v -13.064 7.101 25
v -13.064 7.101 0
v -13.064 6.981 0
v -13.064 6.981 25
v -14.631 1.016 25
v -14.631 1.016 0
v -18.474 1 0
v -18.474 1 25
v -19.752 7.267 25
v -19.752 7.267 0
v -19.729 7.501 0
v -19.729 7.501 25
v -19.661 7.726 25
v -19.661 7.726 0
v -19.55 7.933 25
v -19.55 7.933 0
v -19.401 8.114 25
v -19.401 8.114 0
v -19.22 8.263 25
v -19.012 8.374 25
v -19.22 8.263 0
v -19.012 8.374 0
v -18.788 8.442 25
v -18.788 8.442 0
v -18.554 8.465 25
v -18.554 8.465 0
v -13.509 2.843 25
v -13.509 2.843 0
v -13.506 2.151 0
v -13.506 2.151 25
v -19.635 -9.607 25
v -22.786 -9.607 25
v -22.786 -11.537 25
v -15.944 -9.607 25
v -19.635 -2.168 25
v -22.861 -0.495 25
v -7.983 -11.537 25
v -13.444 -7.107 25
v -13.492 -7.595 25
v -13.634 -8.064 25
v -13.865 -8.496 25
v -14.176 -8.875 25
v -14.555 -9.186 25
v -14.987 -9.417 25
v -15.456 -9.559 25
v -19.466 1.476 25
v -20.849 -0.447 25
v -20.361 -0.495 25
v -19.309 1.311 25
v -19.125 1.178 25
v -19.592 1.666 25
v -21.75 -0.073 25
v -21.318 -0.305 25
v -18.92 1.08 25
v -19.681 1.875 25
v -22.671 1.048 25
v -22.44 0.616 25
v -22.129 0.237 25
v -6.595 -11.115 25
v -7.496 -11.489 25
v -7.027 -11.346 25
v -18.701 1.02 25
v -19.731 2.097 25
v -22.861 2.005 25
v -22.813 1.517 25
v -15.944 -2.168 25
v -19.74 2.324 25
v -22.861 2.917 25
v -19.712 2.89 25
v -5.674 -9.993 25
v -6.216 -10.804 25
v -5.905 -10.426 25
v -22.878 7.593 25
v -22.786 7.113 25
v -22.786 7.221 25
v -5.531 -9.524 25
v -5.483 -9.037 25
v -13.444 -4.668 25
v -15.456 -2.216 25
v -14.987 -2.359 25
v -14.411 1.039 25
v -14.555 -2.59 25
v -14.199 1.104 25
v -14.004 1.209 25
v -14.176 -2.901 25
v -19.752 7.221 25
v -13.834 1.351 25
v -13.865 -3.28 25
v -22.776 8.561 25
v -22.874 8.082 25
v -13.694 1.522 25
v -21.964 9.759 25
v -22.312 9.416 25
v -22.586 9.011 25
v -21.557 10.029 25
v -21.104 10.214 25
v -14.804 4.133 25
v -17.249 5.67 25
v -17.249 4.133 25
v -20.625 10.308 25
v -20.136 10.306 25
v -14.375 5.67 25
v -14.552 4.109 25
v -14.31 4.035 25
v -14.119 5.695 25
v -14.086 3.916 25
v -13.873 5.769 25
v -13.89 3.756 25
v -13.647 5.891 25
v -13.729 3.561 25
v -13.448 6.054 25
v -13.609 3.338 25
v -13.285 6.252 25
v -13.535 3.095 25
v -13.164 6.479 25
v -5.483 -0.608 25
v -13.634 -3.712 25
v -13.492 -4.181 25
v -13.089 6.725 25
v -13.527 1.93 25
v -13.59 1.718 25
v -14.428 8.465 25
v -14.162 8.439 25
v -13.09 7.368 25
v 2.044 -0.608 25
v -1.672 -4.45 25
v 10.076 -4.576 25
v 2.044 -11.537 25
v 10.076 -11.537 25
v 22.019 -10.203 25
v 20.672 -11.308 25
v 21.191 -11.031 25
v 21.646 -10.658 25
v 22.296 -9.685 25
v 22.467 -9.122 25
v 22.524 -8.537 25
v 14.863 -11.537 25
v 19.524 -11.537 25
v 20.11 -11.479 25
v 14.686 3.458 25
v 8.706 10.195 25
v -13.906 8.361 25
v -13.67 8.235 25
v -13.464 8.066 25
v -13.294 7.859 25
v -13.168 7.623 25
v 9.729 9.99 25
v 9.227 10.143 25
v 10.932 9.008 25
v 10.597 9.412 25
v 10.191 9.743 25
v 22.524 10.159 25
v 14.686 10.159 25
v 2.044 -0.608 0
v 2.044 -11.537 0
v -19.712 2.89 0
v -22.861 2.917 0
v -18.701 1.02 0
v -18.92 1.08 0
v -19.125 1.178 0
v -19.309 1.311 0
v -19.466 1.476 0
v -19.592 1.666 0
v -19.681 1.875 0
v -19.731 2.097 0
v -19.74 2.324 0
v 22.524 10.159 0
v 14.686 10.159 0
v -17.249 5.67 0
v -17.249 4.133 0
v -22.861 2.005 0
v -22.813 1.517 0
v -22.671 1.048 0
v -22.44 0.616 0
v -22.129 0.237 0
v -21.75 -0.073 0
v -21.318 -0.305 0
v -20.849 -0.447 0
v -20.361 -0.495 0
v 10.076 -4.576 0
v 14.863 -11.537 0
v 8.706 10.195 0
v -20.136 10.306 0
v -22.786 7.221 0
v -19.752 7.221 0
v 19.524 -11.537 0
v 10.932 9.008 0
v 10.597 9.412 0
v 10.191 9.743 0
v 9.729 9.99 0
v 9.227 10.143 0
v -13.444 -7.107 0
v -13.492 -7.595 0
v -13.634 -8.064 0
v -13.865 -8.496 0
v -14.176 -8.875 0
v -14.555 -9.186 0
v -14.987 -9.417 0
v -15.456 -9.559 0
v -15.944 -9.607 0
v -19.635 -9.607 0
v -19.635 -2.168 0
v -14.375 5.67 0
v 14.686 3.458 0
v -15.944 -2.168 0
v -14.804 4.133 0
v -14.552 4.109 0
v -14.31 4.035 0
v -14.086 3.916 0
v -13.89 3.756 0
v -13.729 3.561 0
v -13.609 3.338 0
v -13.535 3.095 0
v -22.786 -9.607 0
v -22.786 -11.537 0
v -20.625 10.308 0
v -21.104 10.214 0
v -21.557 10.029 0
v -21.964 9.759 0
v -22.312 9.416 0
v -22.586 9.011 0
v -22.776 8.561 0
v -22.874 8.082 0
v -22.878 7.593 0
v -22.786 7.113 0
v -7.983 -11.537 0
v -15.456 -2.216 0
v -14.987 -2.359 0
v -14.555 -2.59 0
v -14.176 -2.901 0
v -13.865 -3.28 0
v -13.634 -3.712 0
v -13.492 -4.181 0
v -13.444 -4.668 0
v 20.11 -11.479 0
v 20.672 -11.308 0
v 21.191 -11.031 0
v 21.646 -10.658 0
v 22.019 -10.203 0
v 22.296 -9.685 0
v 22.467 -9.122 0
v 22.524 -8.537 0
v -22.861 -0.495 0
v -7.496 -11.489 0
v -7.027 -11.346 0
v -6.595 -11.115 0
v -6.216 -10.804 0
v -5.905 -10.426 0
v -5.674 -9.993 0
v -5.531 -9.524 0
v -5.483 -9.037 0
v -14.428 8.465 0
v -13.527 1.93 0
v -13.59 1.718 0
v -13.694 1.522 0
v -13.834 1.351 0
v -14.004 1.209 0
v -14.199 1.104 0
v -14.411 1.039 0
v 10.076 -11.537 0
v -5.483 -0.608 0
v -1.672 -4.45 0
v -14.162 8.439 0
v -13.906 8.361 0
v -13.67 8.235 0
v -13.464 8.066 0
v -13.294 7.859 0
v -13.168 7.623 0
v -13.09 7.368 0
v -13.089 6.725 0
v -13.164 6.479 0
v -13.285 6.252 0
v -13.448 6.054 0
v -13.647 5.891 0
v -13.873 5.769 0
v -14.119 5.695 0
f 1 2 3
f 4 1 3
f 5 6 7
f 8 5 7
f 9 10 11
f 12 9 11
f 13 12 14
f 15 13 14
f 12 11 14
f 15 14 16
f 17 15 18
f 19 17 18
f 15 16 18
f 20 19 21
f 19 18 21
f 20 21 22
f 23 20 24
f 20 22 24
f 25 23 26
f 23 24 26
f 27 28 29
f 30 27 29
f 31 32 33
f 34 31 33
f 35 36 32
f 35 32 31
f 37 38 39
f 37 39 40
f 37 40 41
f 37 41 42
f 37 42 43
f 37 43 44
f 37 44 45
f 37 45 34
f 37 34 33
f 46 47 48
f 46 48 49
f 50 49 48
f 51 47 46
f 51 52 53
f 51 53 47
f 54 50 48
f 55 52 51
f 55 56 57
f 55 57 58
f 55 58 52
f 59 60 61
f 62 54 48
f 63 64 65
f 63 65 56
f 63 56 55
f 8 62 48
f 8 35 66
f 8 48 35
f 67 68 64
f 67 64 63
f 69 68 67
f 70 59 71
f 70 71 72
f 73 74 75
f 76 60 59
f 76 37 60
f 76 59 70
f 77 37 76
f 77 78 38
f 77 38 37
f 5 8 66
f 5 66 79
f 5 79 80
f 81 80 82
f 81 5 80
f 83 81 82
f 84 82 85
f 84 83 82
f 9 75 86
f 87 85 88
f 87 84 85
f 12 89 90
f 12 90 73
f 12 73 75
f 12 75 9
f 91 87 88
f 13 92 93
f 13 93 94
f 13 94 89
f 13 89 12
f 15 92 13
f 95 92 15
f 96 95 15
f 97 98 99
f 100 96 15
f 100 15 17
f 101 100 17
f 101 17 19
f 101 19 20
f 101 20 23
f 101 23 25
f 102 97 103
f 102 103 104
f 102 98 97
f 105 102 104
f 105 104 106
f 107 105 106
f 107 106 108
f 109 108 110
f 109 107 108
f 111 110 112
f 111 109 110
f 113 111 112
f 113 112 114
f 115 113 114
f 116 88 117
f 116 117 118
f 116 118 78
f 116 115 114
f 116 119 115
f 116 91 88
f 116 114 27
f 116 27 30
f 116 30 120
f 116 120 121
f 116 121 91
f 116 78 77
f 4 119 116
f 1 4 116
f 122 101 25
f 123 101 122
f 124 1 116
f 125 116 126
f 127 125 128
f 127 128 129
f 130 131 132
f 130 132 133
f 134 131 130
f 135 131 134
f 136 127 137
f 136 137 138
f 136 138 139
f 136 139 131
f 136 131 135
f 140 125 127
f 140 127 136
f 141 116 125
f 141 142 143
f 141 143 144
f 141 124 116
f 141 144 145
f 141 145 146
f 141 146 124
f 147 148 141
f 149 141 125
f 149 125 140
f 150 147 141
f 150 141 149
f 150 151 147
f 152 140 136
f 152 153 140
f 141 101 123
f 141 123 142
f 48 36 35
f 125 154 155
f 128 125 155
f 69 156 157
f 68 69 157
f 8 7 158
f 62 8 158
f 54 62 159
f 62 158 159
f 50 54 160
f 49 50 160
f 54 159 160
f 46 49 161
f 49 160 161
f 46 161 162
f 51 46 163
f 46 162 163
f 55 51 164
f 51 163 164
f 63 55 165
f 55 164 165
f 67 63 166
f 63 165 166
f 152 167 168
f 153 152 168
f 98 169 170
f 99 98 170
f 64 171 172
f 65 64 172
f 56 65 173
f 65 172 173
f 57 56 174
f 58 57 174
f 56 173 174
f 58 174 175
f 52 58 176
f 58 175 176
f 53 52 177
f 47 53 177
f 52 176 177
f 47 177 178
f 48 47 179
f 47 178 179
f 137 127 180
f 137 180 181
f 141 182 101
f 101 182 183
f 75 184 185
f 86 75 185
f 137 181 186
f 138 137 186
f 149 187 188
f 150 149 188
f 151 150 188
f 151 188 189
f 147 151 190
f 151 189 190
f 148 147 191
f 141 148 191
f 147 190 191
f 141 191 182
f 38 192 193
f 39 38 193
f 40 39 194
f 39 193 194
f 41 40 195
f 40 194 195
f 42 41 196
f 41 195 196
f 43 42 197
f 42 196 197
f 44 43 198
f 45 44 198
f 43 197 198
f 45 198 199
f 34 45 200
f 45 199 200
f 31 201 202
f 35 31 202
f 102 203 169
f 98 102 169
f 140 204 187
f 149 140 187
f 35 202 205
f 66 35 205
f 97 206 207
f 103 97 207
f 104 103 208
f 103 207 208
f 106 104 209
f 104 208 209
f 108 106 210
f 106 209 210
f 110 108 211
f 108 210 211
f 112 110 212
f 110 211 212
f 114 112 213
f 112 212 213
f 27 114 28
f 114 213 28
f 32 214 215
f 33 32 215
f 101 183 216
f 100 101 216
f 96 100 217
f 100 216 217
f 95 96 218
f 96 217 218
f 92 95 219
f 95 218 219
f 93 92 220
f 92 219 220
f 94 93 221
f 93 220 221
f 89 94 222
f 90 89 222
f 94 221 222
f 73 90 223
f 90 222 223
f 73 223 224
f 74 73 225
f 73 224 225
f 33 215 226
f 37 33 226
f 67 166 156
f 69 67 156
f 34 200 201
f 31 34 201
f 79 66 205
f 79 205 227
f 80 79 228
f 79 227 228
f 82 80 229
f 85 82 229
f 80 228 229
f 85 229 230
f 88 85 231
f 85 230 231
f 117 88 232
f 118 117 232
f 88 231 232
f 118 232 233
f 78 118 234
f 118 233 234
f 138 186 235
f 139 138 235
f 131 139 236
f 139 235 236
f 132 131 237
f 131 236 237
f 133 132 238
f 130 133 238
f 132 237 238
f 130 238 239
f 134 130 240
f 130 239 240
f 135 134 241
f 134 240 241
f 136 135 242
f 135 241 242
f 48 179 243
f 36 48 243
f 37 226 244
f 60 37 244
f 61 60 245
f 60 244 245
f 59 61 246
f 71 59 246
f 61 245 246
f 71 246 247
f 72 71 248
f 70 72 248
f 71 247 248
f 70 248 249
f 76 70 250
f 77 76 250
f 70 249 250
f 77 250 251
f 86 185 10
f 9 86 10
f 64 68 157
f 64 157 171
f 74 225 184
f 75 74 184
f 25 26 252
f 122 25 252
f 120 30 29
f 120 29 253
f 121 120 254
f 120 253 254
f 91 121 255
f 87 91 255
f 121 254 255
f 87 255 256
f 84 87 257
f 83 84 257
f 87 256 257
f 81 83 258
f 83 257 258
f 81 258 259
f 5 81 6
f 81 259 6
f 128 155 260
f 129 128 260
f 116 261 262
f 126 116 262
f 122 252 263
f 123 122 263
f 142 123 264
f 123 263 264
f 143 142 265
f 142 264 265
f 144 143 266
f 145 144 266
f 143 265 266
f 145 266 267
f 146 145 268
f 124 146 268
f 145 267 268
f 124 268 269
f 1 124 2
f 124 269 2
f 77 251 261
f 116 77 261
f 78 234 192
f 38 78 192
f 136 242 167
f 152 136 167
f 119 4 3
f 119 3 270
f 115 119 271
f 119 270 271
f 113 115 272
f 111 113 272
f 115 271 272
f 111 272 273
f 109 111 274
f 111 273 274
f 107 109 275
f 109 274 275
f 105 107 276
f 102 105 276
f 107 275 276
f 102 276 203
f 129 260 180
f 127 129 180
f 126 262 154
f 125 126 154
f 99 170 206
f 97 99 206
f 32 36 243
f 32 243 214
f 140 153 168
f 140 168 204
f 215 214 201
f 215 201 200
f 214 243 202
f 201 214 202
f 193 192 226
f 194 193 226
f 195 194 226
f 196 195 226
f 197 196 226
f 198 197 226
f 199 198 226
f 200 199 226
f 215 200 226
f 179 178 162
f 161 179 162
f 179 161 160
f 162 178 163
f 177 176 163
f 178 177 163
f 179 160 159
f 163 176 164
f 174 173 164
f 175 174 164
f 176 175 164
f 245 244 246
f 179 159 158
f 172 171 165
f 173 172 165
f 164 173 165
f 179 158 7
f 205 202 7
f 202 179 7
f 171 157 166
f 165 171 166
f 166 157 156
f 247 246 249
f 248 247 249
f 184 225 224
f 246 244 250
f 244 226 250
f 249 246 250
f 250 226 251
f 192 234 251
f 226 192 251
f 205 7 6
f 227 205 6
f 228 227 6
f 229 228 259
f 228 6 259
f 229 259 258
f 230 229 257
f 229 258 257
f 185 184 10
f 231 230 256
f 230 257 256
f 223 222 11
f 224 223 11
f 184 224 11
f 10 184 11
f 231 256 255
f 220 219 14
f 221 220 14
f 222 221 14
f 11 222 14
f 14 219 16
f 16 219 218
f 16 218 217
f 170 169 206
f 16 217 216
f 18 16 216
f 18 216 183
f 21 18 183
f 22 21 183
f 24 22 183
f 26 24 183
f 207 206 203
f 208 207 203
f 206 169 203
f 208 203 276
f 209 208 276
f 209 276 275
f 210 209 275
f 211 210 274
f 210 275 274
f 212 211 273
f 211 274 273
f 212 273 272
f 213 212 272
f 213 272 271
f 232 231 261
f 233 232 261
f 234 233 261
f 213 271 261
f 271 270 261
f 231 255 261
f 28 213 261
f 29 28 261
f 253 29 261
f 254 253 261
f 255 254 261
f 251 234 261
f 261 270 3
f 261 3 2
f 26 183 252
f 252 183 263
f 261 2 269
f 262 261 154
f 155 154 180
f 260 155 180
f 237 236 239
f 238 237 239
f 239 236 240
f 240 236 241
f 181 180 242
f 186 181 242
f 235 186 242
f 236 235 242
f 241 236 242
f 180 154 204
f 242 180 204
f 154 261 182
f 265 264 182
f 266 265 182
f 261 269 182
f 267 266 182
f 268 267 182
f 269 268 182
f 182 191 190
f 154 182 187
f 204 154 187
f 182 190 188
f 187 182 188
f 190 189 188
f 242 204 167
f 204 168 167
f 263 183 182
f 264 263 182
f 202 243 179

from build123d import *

# Parameters (mm, degrees)
F1_DEPTH = 25


with BuildPart() as f1:
    # F0 (on Top) → F1 (new body)
    with BuildSketch(Plane.XY):
        with BuildLine():
            Line((-22.786474, -11.536708), (-7.983426, -11.536708))
            ThreePointArc((-7.983426, -11.536708), (-6.215659, -10.804475), (-5.483426, -9.036708))
            Line((-5.483426, -9.036708), (-5.483426, -0.607649))
            Line((-5.483426, -0.607649), (-1.672428, -4.450142))
            Line((-1.672428, -4.450142), (2.044082, -0.607649))
            Line((2.044082, -0.607649), (2.044082, -11.536708))
            Line((2.044082, -11.536708), (10.075524, -11.536708))
            Line((10.075524, -11.536708), (10.075524, -4.576126))
            Line((10.075524, -4.576126), (14.862892, -11.536708))
            Line((14.862892, -11.536708), (19.524276, -11.536708))
            ThreePointArc((19.524276, -11.536708), (21.645597, -10.658028), (22.524276, -8.536708))
            Line((22.524276, -8.536708), (22.524276, 10.158991))
            Line((22.524276, 10.158991), (14.685626, 10.158991))
            Line((14.685626, 10.158991), (14.685626, 3.457541))
            Line((14.685626, 3.457541), (10.931709, 9.008034))
            ThreePointArc((10.931709, 9.008034), (9.965858, 9.877737), (8.705565, 10.195408))
            Line((8.705565, 10.195408), (-20.13615, 10.306249))
            ThreePointArc((-20.13615, 10.306249), (-22.311759, 9.415733), (-22.786474, 7.113356))
            Line((-22.786474, 7.113356), (-22.786474, 7.220973))
            Line((-22.786474, 7.220973), (-19.752085, 7.220973))
            Line((-19.752085, 7.220973), (-19.752085, 7.267032))
            ThreePointArc((-19.752085, 7.267032), (-19.401118, 8.114342), (-18.553809, 8.465309))
            Line((-18.553809, 8.465309), (-14.427898, 8.465309))
            ThreePointArc((-14.427898, 8.465309), (-13.463502, 8.065843), (-13.064036, 7.101447))
            Line((-13.064036, 7.101447), (-13.064036, 6.980661))
            ThreePointArc((-13.064036, 6.980661), (-13.44803, 6.053618), (-14.375072, 5.669625))
            Line((-14.375072, 5.669625), (-17.249033, 5.669625))
            Line((-17.249033, 5.669625), (-17.249033, 4.13342))
            Line((-17.249033, 4.13342), (-14.804287, 4.13342))
            ThreePointArc((-14.804287, 4.13342), (-13.890238, 3.755928), (-13.508925, 2.843465))
            Line((-13.508925, 2.843465), (-13.506027, 2.150697))
            ThreePointArc((-13.506027, 2.150697), (-13.833554, 1.350526), (-14.630957, 1.016315))
            Line((-14.630957, 1.016315), (-18.474126, 1.000238))
            ThreePointArc((-18.474126, 1.000238), (-19.391586, 1.390063), (-19.740027, 2.324025))
            Line((-19.740027, 2.324025), (-19.712353, 2.889719))
            Line((-19.712353, 2.889719), (-22.861291, 2.917016))
            Line((-22.861291, 2.917016), (-22.861291, 2.005195))
            ThreePointArc((-22.861291, 2.005195), (-22.129058, 0.237428), (-20.361291, -0.494805))
            Line((-20.361291, -0.494805), (-22.861291, -0.494805))
            Line((-22.861291, -0.494805), (-22.786474, -9.606927))
            Line((-22.786474, -9.606927), (-22.786474, -11.536708))
        make_face()
        with BuildLine():
            Line((-19.634925, -9.606927), (-19.634925, -2.168437))
            Line((-19.634925, -2.168437), (-15.943606, -2.168437))
            ThreePointArc((-15.943606, -2.168437), (-14.175839, -2.90067), (-13.443606, -4.668437))
            Line((-13.443606, -4.668437), (-13.443606, -7.106927))
            ThreePointArc((-13.443606, -7.106927), (-14.175839, -8.874694), (-15.943606, -9.606927))
            Line((-15.943606, -9.606927), (-19.634925, -9.606927))
        make_face(mode=Mode.SUBTRACT)
    extrude(amount=F1_DEPTH)


solid = f1.part
